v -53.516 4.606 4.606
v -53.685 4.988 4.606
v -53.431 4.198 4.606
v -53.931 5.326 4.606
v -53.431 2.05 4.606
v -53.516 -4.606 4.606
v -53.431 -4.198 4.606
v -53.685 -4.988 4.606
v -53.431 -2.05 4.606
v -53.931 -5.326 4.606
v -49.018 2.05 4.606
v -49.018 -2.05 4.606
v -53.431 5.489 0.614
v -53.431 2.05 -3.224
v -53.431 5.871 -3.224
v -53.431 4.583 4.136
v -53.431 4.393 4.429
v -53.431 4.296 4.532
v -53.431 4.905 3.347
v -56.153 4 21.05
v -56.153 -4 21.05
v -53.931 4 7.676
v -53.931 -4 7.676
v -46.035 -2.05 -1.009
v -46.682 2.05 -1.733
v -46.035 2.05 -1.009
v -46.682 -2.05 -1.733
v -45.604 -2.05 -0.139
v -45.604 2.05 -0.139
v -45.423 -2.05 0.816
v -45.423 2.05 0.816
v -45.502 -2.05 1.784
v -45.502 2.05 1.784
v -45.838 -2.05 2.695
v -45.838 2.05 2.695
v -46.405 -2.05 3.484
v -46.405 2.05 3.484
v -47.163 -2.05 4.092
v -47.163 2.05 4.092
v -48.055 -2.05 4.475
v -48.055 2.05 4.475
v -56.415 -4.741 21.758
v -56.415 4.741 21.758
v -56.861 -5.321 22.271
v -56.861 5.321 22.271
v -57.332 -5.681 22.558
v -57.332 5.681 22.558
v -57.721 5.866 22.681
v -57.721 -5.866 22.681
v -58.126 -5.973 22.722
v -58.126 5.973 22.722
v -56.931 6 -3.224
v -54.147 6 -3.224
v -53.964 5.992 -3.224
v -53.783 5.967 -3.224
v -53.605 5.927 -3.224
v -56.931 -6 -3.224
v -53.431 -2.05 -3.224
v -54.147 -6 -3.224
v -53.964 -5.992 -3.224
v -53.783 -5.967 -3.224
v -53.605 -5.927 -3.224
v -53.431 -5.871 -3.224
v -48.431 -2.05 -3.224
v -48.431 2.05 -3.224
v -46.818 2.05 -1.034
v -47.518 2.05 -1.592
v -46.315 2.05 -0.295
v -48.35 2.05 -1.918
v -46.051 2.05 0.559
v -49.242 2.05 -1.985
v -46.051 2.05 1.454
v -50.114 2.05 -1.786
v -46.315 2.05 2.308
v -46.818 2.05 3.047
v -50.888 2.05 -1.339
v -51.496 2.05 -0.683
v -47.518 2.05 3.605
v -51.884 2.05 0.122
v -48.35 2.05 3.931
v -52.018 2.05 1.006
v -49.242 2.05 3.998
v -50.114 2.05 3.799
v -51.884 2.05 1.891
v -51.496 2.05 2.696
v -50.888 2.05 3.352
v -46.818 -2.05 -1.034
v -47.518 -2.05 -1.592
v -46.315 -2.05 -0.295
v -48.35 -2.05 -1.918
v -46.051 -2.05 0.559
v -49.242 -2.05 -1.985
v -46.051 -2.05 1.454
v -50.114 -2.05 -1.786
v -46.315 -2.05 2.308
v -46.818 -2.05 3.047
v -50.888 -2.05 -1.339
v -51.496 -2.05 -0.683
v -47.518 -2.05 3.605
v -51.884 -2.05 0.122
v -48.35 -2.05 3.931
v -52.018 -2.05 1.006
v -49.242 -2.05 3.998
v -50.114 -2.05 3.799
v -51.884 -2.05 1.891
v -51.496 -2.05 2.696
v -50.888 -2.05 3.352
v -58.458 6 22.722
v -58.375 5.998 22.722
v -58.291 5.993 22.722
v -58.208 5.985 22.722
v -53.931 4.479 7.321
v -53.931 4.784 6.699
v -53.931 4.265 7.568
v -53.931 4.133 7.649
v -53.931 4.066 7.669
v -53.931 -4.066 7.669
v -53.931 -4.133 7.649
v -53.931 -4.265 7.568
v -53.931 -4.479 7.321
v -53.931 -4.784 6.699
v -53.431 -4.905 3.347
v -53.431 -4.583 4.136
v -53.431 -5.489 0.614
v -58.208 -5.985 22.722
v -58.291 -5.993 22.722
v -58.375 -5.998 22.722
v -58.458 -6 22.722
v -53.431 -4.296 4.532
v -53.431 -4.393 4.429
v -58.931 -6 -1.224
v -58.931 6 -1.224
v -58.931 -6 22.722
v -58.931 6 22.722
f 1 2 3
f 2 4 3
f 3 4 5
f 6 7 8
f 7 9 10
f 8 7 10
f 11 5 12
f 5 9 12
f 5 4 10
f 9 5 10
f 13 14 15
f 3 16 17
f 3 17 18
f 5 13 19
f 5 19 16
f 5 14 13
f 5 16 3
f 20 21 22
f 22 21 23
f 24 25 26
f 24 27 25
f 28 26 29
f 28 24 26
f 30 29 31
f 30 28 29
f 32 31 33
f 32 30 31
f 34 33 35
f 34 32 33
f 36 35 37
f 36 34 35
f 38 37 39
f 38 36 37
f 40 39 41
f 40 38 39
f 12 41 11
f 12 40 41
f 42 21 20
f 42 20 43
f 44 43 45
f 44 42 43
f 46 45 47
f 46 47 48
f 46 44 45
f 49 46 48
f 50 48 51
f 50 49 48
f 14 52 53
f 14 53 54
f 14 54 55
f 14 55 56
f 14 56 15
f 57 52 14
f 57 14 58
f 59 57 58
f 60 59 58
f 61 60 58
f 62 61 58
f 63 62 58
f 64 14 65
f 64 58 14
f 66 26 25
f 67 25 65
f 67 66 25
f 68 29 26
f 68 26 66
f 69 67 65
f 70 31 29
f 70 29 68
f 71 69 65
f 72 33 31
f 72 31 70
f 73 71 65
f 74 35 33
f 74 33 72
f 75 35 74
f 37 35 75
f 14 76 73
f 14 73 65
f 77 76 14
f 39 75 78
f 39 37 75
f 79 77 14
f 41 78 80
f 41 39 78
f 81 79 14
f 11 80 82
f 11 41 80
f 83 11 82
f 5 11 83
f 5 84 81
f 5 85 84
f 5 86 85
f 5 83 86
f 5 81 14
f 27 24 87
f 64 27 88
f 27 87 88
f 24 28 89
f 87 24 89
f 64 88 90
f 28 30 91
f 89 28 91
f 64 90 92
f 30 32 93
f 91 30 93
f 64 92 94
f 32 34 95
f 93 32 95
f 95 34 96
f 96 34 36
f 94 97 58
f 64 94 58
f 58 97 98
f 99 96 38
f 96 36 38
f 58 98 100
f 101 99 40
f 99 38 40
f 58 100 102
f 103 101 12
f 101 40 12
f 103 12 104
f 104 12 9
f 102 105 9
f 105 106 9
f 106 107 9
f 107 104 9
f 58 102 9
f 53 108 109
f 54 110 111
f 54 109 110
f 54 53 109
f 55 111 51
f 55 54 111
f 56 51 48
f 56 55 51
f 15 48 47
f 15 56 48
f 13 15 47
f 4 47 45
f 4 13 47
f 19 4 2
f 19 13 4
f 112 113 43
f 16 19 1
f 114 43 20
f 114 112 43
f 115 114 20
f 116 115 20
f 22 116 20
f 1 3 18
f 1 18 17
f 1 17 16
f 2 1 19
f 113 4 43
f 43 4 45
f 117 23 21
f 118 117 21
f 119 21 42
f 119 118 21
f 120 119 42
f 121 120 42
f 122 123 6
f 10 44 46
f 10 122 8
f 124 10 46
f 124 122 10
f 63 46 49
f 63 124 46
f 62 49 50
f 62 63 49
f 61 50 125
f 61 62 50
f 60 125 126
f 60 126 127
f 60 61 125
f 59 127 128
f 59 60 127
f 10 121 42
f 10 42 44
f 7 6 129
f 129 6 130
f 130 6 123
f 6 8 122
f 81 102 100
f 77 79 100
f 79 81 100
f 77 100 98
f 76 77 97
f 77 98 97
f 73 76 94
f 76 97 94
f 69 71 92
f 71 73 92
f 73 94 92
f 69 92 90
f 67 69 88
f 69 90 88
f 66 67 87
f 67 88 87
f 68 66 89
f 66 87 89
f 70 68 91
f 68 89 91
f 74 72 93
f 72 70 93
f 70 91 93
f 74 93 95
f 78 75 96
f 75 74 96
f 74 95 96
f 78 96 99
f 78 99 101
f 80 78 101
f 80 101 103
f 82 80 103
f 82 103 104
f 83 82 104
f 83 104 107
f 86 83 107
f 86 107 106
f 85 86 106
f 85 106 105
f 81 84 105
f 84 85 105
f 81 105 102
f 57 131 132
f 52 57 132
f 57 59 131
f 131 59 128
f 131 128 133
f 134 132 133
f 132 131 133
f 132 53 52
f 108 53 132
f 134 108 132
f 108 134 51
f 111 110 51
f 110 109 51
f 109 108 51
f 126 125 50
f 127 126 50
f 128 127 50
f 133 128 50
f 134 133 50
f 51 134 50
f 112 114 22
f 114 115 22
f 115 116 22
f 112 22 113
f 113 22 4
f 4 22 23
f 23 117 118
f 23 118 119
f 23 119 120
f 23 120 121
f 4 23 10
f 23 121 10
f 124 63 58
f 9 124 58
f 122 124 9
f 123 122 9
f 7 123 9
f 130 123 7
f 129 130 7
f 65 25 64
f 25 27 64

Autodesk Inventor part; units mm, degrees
ref_plane "YZ Plane" through (0, 0, 0) normal (1, 0, 0) x (0, 1, 0)
ref_plane "XZ Plane" through (0, 0, 0) normal (0, 1, 0) x (-1, 0, 0)
ref_plane "XY Plane" through (0, 0, 0) normal (0, 0, 1) x (1, 0, 0)
sketch "Sketch1" plane through (0, 0, 0) normal (0, 1, 0) x (-1, 0, 0)
  circle A0 centre (49.0175, 1.0065) radius 3.6
  line L0 (58.9307, -3.2235) -> (48.4307, -3.2235)
  line L1 (58.9307, -3.2235) -> (58.9307, 22.7221)
  line L2 (58.9307, 22.7221) -> (56.4307, 22.7221)
  line L3 (56.4307, 22.7221) -> (53.9307, 7.6757)
  line L4 (53.9307, 7.6757) -> (53.9307, 4.6065)
  line L5 (53.9307, 4.6065) -> (49.0175, 4.6065)
  line L6 (53.4307, -3.2235) -> (53.4307, 4.6065)
  line L7 (46.6824, -1.7334) -> (48.4307, -3.2235)
  circle A1 centre (49.0175, 1.0065) radius 3
  point P0 (0, 0)
  dimension "d0" = 5.5
  dimension "d1" = 5
  dimension "d2" = 2.5
  dimension "d3" = 10.5
  dimension "d4" = 7.2
  dimension "d5" = 6
  dimension "d14" = 4.23
extrude "Extrusion1" add sketch "Sketch1" along normal mid plane 4.1
extrude "Extrusion2" add sketch "Sketch1" along normal mid plane 12 contours L5 L4 L3 L2 L1 L0 L6
fillet "Fillet1" radius 2 3 edges at (-56.4307, 0, 22.7221) (-55.1807, 6, 15.1989) (-55.1807, -6, 15.1989)
chamfer "Chamfer1" distance 2 angle 45 1 edges at (-58.9307, 0, -3.2235)
properties part number "Foot"
